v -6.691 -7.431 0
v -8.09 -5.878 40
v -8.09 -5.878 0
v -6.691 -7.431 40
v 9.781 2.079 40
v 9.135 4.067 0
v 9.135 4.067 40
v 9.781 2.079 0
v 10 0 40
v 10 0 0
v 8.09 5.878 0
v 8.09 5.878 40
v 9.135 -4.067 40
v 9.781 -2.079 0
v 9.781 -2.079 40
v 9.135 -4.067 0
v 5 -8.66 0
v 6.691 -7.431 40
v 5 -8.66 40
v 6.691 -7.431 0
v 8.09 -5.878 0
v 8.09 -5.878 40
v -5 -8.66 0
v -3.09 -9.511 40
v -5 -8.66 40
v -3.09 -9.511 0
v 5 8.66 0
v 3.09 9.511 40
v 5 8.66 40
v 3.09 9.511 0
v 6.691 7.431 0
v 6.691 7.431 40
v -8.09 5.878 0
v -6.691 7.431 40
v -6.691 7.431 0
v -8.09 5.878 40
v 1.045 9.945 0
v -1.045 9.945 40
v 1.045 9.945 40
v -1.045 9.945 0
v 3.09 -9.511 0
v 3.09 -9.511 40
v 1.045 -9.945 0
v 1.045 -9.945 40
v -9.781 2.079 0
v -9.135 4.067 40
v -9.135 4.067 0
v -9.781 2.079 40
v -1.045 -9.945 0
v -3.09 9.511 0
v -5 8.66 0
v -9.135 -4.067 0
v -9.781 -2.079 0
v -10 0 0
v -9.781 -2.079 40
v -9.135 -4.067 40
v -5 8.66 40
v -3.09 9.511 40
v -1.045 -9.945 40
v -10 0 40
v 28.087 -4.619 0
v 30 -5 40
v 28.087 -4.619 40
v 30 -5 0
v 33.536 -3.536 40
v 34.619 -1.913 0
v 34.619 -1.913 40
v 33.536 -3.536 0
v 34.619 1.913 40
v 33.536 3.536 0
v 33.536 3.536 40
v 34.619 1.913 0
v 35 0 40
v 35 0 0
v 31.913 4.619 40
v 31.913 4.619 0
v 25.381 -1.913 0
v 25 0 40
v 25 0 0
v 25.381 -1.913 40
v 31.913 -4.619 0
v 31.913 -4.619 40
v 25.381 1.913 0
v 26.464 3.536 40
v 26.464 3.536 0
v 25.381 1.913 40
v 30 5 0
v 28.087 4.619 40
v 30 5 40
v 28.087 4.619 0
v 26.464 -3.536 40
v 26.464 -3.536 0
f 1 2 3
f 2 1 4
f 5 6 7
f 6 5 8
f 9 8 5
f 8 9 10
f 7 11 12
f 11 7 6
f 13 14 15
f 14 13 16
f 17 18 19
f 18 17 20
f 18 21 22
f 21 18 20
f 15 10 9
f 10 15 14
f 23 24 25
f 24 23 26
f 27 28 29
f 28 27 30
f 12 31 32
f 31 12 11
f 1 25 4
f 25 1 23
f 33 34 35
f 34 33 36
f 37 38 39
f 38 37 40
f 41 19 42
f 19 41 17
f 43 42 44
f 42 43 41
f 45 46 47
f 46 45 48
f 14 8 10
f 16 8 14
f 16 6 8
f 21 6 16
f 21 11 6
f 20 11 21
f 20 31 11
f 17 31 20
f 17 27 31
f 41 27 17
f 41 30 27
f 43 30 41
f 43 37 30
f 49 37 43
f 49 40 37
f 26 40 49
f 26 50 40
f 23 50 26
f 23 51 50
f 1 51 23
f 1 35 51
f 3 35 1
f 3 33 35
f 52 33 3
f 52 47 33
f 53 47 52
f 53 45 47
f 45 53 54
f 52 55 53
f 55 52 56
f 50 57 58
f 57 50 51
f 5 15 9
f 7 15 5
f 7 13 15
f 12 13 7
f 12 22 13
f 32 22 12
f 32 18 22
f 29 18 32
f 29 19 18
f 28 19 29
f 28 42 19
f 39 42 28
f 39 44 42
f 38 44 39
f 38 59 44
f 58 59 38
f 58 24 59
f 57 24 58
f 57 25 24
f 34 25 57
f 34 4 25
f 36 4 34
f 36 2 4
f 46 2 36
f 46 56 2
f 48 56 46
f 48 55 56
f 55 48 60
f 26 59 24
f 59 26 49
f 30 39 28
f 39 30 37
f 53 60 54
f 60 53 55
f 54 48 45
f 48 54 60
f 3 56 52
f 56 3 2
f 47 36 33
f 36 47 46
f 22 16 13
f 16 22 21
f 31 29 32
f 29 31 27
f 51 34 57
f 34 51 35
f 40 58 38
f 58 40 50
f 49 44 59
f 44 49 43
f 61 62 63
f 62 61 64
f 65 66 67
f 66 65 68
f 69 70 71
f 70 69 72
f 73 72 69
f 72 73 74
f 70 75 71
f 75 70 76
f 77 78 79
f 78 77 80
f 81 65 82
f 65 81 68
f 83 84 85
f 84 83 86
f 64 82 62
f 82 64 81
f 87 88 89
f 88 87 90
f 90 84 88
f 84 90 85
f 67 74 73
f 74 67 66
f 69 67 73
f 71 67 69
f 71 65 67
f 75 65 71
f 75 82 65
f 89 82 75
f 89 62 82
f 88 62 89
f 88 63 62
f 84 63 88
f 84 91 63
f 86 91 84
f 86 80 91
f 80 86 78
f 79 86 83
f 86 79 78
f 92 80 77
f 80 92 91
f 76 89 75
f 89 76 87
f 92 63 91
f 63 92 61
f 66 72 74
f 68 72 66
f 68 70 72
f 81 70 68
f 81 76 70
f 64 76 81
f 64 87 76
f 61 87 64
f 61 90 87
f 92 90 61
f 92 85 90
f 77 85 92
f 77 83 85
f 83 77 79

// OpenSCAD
cylinder(r=10,h=40);
translate([30,0,0])cylinder(r=5,h=40);

//screen capture settings
$vpr=[70,0,25];
$vpd=140;
$vpt=[8,15,16];
